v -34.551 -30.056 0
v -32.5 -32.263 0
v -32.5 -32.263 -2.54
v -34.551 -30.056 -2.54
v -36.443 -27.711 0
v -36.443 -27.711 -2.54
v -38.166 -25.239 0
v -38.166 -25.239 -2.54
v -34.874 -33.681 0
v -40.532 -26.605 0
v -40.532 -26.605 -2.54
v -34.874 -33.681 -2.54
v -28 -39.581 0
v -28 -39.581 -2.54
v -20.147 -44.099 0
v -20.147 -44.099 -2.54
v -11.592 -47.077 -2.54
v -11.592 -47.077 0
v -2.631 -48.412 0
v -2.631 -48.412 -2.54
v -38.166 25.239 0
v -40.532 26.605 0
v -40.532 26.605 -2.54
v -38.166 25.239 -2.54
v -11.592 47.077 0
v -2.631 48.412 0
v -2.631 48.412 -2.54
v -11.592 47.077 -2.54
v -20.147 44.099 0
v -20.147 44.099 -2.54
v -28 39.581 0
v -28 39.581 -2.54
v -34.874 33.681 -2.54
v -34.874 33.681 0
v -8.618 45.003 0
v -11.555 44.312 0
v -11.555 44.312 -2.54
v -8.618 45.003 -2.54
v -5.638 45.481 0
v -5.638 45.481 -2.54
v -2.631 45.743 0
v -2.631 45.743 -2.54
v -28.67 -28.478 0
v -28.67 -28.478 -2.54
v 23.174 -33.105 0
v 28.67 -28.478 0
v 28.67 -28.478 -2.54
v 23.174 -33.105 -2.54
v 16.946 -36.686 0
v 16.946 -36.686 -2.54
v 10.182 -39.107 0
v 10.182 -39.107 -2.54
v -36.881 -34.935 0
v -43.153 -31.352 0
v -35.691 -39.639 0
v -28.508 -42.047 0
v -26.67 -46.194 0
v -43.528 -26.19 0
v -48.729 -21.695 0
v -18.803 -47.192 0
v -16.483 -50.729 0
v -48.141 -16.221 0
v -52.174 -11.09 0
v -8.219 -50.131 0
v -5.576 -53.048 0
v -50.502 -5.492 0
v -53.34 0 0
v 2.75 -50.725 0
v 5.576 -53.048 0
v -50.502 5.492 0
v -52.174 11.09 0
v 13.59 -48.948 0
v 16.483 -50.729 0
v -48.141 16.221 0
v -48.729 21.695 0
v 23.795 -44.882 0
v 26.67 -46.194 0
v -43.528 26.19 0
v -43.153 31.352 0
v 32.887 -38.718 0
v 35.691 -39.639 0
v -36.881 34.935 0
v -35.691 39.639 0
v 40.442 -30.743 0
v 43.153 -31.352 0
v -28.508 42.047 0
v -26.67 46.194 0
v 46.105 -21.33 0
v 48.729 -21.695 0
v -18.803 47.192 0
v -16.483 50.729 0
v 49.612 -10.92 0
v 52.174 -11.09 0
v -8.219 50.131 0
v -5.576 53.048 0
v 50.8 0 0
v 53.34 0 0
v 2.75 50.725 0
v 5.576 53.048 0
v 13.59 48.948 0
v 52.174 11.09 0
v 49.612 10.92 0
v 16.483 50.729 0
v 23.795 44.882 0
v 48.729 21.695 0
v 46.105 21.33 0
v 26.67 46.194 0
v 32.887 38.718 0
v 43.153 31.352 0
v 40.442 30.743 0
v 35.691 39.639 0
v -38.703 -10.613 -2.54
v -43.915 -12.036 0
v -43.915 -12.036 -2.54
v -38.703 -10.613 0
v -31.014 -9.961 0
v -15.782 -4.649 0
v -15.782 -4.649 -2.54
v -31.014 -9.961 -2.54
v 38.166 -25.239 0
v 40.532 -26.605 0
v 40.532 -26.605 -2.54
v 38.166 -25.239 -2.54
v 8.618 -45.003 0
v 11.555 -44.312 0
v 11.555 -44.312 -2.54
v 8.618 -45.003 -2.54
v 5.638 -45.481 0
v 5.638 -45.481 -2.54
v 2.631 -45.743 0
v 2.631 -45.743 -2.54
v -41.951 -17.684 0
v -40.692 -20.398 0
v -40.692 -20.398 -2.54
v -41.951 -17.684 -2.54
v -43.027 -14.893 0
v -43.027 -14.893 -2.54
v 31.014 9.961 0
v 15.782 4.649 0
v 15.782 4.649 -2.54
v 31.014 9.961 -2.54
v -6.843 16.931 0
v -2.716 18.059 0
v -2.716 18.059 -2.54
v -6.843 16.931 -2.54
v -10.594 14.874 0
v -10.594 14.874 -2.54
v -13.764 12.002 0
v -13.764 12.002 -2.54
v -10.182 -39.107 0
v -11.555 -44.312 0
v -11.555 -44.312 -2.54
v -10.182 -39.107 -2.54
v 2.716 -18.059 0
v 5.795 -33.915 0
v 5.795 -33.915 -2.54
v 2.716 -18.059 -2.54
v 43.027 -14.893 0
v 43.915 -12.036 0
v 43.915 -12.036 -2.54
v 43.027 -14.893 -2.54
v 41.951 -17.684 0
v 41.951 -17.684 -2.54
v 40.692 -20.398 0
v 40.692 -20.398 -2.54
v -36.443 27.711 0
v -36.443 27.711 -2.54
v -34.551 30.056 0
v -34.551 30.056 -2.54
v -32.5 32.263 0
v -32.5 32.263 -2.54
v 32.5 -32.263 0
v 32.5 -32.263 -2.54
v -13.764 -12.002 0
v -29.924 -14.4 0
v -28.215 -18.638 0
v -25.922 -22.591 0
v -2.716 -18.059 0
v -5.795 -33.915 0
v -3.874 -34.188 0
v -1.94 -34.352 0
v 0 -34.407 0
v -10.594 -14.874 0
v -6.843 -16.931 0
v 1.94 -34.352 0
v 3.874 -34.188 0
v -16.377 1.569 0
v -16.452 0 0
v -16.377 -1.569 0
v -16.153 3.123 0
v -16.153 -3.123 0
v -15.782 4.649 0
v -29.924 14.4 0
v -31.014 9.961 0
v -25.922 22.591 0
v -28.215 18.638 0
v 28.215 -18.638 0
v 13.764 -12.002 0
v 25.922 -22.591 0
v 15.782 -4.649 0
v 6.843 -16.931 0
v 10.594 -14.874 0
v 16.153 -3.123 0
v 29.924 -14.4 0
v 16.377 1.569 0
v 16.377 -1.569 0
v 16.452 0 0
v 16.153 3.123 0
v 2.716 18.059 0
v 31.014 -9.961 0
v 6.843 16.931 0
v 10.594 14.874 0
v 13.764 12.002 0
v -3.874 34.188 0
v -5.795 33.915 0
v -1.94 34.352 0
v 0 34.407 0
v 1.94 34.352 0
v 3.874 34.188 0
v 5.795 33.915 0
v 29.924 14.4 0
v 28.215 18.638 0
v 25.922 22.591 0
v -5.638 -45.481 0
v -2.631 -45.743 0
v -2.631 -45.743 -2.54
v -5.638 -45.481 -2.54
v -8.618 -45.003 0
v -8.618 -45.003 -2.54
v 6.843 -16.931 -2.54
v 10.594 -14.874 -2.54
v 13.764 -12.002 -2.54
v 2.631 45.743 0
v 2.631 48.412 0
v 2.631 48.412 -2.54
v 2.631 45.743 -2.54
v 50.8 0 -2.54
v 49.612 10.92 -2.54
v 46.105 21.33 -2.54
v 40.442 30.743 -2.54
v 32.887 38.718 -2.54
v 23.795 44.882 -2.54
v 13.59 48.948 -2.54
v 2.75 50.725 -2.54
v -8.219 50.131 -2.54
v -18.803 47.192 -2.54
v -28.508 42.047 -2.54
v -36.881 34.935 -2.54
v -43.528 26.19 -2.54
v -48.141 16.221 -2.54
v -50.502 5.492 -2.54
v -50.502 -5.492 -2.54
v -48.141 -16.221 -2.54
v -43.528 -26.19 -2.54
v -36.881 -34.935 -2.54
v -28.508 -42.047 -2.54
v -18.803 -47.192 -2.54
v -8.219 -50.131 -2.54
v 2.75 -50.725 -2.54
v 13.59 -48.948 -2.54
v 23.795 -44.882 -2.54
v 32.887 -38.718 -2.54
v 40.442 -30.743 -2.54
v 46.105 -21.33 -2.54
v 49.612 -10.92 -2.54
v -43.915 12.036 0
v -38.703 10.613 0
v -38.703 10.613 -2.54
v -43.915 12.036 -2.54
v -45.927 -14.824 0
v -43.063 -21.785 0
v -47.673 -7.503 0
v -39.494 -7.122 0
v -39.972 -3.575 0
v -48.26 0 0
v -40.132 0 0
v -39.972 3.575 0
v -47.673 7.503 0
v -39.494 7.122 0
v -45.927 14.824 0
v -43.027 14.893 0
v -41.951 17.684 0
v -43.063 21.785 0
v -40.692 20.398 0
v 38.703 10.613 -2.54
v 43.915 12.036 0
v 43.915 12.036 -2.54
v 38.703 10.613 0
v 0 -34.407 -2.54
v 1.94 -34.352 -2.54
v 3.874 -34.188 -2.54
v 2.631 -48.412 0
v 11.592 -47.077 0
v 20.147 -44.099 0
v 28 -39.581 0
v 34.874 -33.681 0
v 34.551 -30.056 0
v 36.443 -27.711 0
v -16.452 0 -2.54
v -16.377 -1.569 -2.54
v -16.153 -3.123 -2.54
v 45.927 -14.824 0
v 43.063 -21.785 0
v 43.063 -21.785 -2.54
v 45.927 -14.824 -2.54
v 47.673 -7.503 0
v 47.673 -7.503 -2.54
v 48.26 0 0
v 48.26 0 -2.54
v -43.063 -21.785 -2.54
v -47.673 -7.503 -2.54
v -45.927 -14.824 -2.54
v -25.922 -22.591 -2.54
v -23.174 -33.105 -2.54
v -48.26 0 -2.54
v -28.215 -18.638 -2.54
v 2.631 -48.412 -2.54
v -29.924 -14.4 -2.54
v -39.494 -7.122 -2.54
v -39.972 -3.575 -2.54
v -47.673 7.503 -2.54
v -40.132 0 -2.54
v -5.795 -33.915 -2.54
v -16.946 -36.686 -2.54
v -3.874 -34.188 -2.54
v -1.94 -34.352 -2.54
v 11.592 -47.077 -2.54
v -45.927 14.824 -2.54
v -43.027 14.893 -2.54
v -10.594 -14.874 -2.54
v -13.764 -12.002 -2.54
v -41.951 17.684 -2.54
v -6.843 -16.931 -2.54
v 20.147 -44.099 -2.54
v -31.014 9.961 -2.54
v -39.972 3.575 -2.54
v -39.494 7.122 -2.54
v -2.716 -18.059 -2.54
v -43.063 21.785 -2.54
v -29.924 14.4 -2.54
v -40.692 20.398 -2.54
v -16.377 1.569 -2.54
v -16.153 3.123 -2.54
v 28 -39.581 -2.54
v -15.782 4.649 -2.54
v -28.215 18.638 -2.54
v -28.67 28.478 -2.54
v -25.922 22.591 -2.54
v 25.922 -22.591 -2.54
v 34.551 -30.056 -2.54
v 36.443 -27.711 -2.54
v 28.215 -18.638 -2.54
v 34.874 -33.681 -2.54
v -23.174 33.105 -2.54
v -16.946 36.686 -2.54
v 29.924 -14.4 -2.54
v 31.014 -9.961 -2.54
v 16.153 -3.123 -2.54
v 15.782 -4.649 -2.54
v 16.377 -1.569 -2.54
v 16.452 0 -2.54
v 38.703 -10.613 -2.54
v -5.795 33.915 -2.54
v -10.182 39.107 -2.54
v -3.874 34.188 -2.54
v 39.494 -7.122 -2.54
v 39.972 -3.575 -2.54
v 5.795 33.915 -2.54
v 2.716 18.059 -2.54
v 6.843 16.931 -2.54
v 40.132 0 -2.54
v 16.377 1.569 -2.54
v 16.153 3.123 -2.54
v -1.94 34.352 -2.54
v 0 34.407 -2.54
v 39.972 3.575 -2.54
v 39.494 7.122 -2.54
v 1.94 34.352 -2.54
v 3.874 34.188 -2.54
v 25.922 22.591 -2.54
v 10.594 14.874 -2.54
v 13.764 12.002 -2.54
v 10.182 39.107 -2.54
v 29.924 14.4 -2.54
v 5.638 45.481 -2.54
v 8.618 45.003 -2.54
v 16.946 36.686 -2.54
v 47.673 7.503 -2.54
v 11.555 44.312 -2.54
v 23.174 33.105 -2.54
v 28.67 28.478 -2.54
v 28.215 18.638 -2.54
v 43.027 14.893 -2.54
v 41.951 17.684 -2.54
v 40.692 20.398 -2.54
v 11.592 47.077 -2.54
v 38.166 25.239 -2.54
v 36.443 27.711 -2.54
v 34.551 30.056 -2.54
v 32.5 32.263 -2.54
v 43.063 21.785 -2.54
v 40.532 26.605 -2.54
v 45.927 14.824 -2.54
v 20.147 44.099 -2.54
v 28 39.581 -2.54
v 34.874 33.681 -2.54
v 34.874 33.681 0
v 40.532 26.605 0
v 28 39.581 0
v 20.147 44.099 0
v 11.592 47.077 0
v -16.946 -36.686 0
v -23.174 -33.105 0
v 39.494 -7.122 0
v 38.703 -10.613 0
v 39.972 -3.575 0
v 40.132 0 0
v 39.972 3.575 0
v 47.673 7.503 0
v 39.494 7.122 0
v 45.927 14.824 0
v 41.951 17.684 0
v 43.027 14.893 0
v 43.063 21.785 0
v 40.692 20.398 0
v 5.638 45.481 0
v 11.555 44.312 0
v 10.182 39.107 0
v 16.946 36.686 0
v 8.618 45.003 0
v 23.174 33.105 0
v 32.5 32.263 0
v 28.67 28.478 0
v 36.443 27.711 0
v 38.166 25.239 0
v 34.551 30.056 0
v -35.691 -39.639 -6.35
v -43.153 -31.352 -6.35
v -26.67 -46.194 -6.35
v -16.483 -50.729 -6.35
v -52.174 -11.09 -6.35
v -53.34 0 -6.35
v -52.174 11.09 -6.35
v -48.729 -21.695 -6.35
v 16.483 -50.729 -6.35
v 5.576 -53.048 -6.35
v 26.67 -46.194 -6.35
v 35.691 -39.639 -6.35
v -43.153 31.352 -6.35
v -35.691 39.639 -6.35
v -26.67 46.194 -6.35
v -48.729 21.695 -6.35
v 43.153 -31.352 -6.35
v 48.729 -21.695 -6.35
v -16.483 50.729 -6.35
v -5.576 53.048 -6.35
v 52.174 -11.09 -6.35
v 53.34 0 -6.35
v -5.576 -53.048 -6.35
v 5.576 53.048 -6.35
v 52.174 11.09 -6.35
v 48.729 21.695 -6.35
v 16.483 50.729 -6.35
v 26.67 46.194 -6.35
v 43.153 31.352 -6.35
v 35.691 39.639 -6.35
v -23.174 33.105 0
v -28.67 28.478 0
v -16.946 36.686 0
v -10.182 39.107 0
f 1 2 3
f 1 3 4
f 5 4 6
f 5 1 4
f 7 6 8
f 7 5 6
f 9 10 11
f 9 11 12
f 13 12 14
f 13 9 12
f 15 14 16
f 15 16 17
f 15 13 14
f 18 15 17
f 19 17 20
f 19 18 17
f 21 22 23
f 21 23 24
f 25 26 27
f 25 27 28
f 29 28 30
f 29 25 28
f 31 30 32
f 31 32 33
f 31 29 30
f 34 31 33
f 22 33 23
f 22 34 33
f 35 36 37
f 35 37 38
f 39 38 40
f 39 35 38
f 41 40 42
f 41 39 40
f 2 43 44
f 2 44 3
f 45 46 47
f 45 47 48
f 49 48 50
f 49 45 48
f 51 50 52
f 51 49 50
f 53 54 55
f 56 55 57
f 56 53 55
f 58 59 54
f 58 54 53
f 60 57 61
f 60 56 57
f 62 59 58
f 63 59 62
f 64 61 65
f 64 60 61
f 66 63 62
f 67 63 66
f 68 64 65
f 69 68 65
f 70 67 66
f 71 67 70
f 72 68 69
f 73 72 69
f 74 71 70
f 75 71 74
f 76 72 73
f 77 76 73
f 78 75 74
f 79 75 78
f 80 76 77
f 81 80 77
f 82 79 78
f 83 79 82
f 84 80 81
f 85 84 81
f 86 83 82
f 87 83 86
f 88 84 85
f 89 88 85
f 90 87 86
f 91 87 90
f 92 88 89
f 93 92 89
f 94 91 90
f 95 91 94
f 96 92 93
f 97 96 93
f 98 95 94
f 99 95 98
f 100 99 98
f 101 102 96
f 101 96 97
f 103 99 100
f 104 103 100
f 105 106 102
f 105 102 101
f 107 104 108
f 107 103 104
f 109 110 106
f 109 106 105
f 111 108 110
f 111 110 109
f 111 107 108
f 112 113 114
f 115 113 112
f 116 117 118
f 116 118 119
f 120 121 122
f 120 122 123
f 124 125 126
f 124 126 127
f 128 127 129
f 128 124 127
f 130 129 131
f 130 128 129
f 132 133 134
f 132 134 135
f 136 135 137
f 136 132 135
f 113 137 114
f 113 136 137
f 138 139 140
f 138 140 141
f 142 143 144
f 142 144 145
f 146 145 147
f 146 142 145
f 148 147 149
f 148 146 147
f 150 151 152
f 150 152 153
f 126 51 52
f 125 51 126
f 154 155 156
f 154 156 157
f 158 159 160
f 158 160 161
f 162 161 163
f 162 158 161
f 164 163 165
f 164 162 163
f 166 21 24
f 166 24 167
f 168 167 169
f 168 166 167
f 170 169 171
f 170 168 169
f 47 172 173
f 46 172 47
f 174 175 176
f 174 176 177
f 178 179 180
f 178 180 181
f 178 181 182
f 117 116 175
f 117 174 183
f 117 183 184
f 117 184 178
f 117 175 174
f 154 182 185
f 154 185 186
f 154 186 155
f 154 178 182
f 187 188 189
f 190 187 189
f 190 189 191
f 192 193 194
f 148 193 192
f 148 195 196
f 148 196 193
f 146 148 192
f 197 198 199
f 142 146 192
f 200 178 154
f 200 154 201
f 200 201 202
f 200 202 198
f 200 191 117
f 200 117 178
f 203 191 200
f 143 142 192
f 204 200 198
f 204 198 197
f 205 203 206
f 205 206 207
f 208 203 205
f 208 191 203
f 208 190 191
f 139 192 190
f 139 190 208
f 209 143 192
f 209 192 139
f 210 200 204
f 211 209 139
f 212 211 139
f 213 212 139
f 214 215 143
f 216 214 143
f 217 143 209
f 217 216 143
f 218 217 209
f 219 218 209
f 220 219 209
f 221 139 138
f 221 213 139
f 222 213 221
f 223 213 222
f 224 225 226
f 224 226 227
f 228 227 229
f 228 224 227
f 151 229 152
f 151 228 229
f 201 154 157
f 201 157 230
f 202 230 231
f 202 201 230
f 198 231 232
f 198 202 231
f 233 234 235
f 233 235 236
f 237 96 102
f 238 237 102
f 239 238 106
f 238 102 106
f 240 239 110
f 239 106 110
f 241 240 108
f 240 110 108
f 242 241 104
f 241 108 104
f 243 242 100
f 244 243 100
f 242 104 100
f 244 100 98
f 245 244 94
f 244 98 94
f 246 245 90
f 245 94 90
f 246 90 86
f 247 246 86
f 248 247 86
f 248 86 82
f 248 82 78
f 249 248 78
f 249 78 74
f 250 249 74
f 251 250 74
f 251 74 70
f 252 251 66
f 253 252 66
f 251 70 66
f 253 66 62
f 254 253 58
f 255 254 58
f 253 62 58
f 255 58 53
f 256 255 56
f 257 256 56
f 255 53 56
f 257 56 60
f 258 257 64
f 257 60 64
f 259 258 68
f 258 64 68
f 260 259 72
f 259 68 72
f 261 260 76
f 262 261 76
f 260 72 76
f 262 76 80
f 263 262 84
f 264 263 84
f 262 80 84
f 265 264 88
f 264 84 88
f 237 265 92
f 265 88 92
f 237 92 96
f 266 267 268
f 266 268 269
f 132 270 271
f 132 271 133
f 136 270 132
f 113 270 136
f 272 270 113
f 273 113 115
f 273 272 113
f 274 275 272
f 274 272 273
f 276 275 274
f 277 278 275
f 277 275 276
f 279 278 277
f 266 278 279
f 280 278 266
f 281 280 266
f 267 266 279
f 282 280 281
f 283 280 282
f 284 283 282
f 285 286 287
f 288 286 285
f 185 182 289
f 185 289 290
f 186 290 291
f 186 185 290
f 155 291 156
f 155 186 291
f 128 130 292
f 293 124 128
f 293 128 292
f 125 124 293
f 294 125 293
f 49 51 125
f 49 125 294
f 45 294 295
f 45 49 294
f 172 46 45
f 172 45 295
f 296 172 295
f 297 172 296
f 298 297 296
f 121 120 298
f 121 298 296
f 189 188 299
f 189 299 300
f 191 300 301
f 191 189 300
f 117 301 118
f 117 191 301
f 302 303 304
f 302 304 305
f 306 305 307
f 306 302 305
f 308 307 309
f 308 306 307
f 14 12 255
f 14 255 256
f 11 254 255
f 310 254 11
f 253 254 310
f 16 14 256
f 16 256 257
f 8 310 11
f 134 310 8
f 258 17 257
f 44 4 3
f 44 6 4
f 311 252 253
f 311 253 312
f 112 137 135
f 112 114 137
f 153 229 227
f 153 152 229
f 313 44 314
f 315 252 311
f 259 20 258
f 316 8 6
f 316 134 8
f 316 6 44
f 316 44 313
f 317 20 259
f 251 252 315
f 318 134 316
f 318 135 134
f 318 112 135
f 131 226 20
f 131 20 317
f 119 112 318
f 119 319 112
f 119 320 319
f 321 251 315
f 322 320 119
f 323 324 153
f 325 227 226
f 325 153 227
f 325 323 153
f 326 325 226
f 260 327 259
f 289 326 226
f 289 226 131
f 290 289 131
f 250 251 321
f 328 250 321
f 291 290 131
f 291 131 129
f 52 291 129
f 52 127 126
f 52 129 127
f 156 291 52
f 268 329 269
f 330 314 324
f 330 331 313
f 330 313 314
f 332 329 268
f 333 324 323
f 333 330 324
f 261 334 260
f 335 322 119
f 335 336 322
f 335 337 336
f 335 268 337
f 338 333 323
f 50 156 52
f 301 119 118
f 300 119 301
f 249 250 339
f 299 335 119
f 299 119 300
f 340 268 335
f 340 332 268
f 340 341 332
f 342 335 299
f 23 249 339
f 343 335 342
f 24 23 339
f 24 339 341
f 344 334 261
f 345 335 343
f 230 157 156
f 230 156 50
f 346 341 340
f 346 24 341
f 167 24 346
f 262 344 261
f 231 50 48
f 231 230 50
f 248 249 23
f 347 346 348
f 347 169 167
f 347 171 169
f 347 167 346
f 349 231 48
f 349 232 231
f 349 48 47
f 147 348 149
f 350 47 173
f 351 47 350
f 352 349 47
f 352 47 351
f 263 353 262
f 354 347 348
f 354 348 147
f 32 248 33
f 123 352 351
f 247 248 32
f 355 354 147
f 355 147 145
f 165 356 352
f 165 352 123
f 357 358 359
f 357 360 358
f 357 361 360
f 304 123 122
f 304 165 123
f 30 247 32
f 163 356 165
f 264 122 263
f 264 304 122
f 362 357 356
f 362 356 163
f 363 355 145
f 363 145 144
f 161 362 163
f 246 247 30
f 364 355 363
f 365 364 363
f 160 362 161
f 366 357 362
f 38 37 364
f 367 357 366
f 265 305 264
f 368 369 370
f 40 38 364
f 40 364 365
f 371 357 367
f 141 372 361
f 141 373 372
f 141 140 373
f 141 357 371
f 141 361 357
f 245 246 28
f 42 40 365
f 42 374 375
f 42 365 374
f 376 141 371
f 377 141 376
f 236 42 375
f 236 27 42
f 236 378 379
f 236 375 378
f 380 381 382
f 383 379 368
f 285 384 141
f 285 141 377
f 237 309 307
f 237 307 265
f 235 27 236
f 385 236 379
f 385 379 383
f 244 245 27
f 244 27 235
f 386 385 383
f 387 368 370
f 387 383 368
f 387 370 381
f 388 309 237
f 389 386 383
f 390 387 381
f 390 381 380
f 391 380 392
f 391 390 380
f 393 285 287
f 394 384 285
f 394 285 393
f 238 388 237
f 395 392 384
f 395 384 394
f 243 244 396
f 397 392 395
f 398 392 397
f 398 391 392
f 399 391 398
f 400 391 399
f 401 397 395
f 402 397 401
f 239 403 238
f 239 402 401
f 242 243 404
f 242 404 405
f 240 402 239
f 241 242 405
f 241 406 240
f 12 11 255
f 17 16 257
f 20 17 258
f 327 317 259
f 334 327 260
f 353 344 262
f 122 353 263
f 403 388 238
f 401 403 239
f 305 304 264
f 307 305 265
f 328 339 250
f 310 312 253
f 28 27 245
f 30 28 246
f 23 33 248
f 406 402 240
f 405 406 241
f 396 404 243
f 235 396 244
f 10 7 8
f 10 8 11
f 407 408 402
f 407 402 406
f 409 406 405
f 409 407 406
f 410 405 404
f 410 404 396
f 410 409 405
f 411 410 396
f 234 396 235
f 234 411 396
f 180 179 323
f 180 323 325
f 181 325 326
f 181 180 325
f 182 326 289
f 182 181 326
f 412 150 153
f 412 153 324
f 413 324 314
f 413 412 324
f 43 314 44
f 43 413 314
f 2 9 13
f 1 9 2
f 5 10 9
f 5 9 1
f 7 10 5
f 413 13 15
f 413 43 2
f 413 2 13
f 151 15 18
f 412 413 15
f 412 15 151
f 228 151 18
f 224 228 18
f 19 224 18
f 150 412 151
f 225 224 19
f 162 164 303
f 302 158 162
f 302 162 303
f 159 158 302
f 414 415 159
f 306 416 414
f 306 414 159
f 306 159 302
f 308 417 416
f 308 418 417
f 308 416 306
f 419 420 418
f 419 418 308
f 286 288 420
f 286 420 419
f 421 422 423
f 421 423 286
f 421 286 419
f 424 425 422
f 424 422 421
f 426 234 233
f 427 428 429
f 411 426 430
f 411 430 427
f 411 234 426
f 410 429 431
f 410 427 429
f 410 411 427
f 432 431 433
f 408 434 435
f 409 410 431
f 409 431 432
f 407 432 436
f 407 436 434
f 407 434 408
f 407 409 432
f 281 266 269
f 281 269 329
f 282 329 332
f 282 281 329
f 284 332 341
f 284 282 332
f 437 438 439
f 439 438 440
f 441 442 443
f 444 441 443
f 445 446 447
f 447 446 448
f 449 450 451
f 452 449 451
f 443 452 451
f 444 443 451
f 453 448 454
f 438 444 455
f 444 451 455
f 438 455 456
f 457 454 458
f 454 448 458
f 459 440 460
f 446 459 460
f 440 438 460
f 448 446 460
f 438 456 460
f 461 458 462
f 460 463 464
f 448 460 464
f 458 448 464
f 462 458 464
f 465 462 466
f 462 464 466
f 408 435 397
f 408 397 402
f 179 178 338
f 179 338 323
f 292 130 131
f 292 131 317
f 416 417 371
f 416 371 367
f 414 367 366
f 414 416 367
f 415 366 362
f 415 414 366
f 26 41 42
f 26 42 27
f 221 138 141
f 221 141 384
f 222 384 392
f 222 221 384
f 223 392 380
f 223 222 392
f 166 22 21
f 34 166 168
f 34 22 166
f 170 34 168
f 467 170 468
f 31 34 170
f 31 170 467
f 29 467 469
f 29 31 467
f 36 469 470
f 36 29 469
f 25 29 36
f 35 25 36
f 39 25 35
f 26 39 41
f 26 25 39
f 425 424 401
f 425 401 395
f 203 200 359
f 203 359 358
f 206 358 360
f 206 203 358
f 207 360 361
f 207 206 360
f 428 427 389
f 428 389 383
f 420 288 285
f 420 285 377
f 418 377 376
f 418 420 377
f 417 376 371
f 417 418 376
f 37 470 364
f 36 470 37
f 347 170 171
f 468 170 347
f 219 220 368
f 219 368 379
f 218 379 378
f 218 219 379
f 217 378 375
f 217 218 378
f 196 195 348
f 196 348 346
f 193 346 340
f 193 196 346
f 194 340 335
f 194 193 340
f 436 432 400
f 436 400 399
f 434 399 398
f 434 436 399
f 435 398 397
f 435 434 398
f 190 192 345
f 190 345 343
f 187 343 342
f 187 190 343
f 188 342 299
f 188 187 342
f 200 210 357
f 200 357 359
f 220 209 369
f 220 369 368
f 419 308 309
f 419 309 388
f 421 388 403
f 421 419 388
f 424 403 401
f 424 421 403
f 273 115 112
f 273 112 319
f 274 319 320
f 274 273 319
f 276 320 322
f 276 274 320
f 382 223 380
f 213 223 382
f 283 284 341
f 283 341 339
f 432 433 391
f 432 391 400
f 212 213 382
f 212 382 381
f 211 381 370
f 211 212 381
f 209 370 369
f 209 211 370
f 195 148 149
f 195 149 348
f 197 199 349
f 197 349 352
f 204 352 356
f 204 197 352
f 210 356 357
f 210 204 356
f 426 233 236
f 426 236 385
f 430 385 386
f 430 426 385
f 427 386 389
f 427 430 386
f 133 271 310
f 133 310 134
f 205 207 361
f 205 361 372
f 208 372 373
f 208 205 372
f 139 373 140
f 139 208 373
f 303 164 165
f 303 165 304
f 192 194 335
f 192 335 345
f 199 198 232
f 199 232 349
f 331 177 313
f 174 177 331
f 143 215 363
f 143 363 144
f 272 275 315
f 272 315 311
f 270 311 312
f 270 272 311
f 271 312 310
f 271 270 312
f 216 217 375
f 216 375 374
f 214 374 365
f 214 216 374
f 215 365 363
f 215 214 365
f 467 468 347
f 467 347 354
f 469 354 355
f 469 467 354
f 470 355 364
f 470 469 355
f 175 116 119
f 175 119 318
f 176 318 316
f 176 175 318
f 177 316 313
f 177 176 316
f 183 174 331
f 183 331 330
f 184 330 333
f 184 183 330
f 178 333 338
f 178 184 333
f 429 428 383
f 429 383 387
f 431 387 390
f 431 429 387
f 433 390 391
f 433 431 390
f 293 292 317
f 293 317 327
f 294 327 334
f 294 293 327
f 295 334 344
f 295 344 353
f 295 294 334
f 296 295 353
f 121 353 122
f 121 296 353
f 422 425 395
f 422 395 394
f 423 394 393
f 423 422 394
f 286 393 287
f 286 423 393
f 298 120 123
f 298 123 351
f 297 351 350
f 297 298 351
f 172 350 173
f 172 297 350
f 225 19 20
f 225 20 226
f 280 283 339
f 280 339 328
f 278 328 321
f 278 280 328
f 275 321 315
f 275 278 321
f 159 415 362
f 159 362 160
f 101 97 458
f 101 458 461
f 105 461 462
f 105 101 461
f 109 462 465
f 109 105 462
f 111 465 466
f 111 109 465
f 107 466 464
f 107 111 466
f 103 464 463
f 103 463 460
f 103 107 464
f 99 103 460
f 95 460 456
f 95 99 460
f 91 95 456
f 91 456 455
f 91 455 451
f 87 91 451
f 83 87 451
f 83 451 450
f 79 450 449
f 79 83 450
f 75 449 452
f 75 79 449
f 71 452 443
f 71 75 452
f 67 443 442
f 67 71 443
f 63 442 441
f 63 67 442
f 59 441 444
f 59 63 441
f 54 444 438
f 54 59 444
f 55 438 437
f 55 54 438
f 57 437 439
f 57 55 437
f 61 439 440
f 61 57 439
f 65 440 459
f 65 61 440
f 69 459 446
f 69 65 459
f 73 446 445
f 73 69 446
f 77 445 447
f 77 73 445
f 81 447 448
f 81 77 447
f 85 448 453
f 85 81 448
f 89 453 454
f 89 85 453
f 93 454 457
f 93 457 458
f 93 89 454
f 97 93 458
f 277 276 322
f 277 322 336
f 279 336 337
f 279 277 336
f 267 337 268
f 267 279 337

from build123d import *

# Parameters (mm, degrees)
F2_R     = 53.34
F3_DEPTH = 6.35
F0_R     = 50.8
F4_DEPTH = 2.54
F5_DEPTH = 2.54


with BuildPart() as f3:
    # F2 (on Top) → F3 (new body)
    with BuildSketch(Plane.XY):
        Circle(F2_R)
    extrude(amount=-F3_DEPTH)

    # F0 (on Top) → F4 (cut)
    with BuildSketch(Plane.XY):
        Circle(F0_R)
    extrude(amount=-F4_DEPTH, mode=Mode.SUBTRACT)

    # F1 (on Top) → F5 (join)
    with BuildSketch(Plane.XY):
        with BuildLine():
            ThreePointArc((-43.063388, 21.784679), (-46.942873, 11.197957), (-48.26, 0))
            ThreePointArc((-48.26, 0), (-46.942873, -11.197957), (-43.063388, -21.784679))
            Line((-43.063388, -21.784679), (-40.692139, -20.398091))
            ThreePointArc((-40.692139, -20.398091), (-42.512578, -16.297657), (-43.915142, -12.036159))
            Line((-43.915142, -12.036159), (-38.702908, -10.612585))
            ThreePointArc((-38.702908, -10.612585), (-39.772793, -5.354158), (-40.13156, 0))
            ThreePointArc((-40.13156, 0), (-39.772793, 5.354158), (-38.702908, 10.612585))
            Line((-38.702908, 10.612585), (-43.915142, 12.036159))
            ThreePointArc((-43.915142, 12.036159), (-42.512578, 16.297657), (-40.692139, 20.398091))
            Line((-40.692139, 20.398091), (-43.063388, 21.784679))
        make_face()
        with BuildLine():
            Line((-38.165818, -25.239456), (-40.531515, -26.604988))
            ThreePointArc((-40.531515, -26.604988), (-24.179309, -42.023686), (-2.631168, -48.411839))
            Line((-2.631168, -48.411839), (-2.631168, -45.742772))
            ThreePointArc((-2.631168, -45.742772), (-7.132062, -45.269114), (-11.555377, -44.311676))
            Line((-11.555377, -44.311676), (-10.181512, -39.106512))
            ThreePointArc((-10.181512, -39.106512), (-20.139594, -35.033973), (-28.670142, -28.478157))
            Line((-28.670142, -28.478157), (-32.500429, -32.26304))
            ThreePointArc((-32.500429, -32.26304), (-35.517393, -28.899884), (-38.165818, -25.239456))
        make_face()
        with BuildLine():
            Line((-2.71646, -18.05863), (-5.79492, -33.915079))
            ThreePointArc((-5.79492, -33.915079), (-2.907863, -34.283495), (0, -34.406594))
            ThreePointArc((0, -34.406594), (2.907863, -34.283495), (5.79492, -33.915079))
            Line((5.79492, -33.915079), (2.71646, -18.05863))
            ThreePointArc((2.71646, -18.05863), (8.779304, -16.013029), (13.764323, -12.001529))
            Line((13.764323, -12.001529), (25.921796, -22.591443))
            ThreePointArc((25.921796, -22.591443), (29.145002, -16.549346), (31.013678, -9.961172))
            Line((31.013678, -9.961172), (15.781759, -4.649021))
            ThreePointArc((15.781759, -4.649021), (16.283782, -2.348563), (16.452274, 0))
            ThreePointArc((16.452274, 0), (16.283782, 2.348563), (15.781759, 4.649021))
            Line((15.781759, 4.649021), (31.013678, 9.961172))
            ThreePointArc((31.013678, 9.961172), (29.145002, 16.549346), (25.921796, 22.591443))
            Line((25.921796, 22.591443), (13.764323, 12.001529))
            ThreePointArc((13.764323, 12.001529), (8.779304, 16.013029), (2.71646, 18.05863))
            Line((2.71646, 18.05863), (5.79492, 33.915079))
            ThreePointArc((5.79492, 33.915079), (2.907863, 34.283495), (0, 34.406594))
            ThreePointArc((0, 34.406594), (-2.907863, 34.283495), (-5.79492, 33.915079))
            Line((-5.79492, 33.915079), (-2.71646, 18.05863))
            ThreePointArc((-2.71646, 18.05863), (-8.779304, 16.013029), (-13.764323, 12.001529))
            Line((-13.764323, 12.001529), (-25.921796, 22.591443))
            ThreePointArc((-25.921796, 22.591443), (-29.145002, 16.549346), (-31.013678, 9.961172))
            Line((-31.013678, 9.961172), (-15.781759, 4.649021))
            ThreePointArc((-15.781759, 4.649021), (-16.283782, 2.348563), (-16.452274, 0))
            ThreePointArc((-16.452274, 0), (-16.283782, -2.348563), (-15.781759, -4.649021))
            Line((-15.781759, -4.649021), (-31.013678, -9.961172))
            ThreePointArc((-31.013678, -9.961172), (-29.145002, -16.549346), (-25.921796, -22.591443))
            Line((-25.921796, -22.591443), (-13.764323, -12.001529))
            ThreePointArc((-13.764323, -12.001529), (-8.779304, -16.013029), (-2.71646, -18.05863))
        make_face()
        with BuildLine():
            Line((2.631168, -45.742772), (2.631168, -48.411839))
            ThreePointArc((2.631168, -48.411839), (24.179309, -42.023686), (40.531515, -26.604988))
            Line((40.531515, -26.604988), (38.165818, -25.239456))
            ThreePointArc((38.165818, -25.239456), (35.517393, -28.899884), (32.500429, -32.26304))
            Line((32.500429, -32.26304), (28.670142, -28.478157))
            ThreePointArc((28.670142, -28.478157), (20.139594, -35.033973), (10.181512, -39.106512))
            Line((10.181512, -39.106512), (11.555377, -44.311676))
            ThreePointArc((11.555377, -44.311676), (7.132062, -45.269114), (2.631168, -45.742772))
        make_face()
        with BuildLine():
            ThreePointArc((40.13156, 0), (39.772793, -5.354158), (38.702908, -10.612585))
            Line((38.702908, -10.612585), (43.915142, -12.036159))
            ThreePointArc((43.915142, -12.036159), (42.512578, -16.297657), (40.692139, -20.398091))
            Line((40.692139, -20.398091), (43.063388, -21.784679))
            ThreePointArc((43.063388, -21.784679), (46.942873, -11.197957), (48.26, 0))
            ThreePointArc((48.26, 0), (46.942873, 11.197957), (43.063388, 21.784679))
            Line((43.063388, 21.784679), (40.692139, 20.398091))
            ThreePointArc((40.692139, 20.398091), (42.512578, 16.297657), (43.915142, 12.036159))
            Line((43.915142, 12.036159), (38.702908, 10.612585))
            ThreePointArc((38.702908, 10.612585), (39.772793, 5.354158), (40.13156, 0))
        make_face()
        with BuildLine():
            ThreePointArc((40.531515, 26.604988), (24.179309, 42.023686), (2.631168, 48.411839))
            Line((2.631168, 48.411839), (2.631168, 45.742772))
            ThreePointArc((2.631168, 45.742772), (7.132062, 45.269114), (11.555377, 44.311676))
            Line((11.555377, 44.311676), (10.181512, 39.106512))
            ThreePointArc((10.181512, 39.106512), (20.139594, 35.033973), (28.670142, 28.478157))
            Line((28.670142, 28.478157), (32.500429, 32.26304))
            ThreePointArc((32.500429, 32.26304), (35.517393, 28.899884), (38.165818, 25.239456))
            Line((38.165818, 25.239456), (40.531515, 26.604988))
        make_face()
        with BuildLine():
            ThreePointArc((-2.631168, 48.411839), (-24.179309, 42.023686), (-40.531515, 26.604988))
            Line((-40.531515, 26.604988), (-38.165818, 25.239456))
            ThreePointArc((-38.165818, 25.239456), (-35.517393, 28.899884), (-32.500429, 32.26304))
            Line((-32.500429, 32.26304), (-28.670142, 28.478157))
            ThreePointArc((-28.670142, 28.478157), (-20.139594, 35.033973), (-10.181512, 39.106512))
            Line((-10.181512, 39.106512), (-11.555377, 44.311676))
            ThreePointArc((-11.555377, 44.311676), (-7.132062, 45.269114), (-2.631168, 45.742772))
            Line((-2.631168, 45.742772), (-2.631168, 48.411839))
        make_face()
    extrude(amount=-F5_DEPTH)


solid = f3.part
